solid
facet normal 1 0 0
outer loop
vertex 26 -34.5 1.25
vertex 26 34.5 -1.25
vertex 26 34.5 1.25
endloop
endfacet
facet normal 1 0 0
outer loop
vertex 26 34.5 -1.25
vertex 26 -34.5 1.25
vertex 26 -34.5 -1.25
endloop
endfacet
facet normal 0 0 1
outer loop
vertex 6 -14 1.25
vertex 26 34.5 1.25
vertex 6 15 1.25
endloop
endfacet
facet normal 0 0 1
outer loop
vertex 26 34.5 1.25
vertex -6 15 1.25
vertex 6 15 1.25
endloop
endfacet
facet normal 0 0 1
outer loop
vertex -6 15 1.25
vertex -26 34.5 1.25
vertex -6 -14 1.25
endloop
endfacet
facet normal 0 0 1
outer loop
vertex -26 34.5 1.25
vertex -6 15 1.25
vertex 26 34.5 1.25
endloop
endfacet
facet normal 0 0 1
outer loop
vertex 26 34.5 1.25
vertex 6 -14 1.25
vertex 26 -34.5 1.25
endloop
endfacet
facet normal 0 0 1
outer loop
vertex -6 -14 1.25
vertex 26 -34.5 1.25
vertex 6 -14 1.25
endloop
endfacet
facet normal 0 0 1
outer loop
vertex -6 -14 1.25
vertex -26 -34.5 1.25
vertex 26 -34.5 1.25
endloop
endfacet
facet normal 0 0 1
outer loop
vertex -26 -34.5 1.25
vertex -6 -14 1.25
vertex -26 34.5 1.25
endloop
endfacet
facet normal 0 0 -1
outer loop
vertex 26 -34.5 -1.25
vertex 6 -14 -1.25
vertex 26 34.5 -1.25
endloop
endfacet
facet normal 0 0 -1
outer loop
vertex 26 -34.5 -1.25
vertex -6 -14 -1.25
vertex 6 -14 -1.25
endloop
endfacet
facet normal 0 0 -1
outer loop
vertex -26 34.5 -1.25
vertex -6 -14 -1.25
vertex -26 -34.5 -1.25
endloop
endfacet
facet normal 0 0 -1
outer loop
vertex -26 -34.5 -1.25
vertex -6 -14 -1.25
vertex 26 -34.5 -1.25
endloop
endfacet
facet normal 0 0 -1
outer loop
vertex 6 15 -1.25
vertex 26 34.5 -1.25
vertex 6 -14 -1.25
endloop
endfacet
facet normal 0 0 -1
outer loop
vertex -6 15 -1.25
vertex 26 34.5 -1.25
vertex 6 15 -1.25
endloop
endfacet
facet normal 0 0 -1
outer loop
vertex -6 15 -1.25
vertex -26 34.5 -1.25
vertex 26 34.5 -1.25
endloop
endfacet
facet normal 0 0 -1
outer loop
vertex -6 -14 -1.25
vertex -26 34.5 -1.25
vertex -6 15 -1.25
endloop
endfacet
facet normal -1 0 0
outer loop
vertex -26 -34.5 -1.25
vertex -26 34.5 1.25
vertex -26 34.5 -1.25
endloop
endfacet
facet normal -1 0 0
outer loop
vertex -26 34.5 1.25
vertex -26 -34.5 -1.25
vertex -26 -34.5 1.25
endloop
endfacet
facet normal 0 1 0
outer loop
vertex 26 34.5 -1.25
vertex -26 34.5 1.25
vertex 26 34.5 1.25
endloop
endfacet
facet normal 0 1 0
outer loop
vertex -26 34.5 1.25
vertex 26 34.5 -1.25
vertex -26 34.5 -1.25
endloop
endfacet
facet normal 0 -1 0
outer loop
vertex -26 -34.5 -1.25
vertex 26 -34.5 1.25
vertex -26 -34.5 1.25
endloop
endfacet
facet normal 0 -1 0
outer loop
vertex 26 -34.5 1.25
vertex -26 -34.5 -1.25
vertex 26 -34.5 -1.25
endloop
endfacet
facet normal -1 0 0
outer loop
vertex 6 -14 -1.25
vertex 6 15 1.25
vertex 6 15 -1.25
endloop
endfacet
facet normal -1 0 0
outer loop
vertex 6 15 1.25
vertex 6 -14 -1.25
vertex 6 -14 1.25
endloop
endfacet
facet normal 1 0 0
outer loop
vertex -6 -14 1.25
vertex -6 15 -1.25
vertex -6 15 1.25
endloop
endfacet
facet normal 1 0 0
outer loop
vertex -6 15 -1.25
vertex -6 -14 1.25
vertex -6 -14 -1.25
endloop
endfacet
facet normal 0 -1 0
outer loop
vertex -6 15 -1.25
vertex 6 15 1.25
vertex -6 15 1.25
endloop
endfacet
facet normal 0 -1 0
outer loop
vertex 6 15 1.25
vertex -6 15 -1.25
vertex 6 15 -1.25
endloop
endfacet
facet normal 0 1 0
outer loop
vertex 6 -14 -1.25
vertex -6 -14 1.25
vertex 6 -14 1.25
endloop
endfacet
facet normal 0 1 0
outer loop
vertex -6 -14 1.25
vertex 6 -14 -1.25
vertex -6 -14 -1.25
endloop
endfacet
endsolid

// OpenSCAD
/* a tool for holding the stencil in 
place while applying paste
*/

stencil_width = 52;
stencil_height = 69;
pcb_width = 12;
pcb_height = 29;
thickness = 2.5;
//height_offset = 2.5;
height_offset = 0.5; // for testing

difference()
{
    cube([stencil_width,stencil_height,thickness],true);
    
    translate([0,height_offset,0]) cube([pcb_width,pcb_height,thickness],true);
}
